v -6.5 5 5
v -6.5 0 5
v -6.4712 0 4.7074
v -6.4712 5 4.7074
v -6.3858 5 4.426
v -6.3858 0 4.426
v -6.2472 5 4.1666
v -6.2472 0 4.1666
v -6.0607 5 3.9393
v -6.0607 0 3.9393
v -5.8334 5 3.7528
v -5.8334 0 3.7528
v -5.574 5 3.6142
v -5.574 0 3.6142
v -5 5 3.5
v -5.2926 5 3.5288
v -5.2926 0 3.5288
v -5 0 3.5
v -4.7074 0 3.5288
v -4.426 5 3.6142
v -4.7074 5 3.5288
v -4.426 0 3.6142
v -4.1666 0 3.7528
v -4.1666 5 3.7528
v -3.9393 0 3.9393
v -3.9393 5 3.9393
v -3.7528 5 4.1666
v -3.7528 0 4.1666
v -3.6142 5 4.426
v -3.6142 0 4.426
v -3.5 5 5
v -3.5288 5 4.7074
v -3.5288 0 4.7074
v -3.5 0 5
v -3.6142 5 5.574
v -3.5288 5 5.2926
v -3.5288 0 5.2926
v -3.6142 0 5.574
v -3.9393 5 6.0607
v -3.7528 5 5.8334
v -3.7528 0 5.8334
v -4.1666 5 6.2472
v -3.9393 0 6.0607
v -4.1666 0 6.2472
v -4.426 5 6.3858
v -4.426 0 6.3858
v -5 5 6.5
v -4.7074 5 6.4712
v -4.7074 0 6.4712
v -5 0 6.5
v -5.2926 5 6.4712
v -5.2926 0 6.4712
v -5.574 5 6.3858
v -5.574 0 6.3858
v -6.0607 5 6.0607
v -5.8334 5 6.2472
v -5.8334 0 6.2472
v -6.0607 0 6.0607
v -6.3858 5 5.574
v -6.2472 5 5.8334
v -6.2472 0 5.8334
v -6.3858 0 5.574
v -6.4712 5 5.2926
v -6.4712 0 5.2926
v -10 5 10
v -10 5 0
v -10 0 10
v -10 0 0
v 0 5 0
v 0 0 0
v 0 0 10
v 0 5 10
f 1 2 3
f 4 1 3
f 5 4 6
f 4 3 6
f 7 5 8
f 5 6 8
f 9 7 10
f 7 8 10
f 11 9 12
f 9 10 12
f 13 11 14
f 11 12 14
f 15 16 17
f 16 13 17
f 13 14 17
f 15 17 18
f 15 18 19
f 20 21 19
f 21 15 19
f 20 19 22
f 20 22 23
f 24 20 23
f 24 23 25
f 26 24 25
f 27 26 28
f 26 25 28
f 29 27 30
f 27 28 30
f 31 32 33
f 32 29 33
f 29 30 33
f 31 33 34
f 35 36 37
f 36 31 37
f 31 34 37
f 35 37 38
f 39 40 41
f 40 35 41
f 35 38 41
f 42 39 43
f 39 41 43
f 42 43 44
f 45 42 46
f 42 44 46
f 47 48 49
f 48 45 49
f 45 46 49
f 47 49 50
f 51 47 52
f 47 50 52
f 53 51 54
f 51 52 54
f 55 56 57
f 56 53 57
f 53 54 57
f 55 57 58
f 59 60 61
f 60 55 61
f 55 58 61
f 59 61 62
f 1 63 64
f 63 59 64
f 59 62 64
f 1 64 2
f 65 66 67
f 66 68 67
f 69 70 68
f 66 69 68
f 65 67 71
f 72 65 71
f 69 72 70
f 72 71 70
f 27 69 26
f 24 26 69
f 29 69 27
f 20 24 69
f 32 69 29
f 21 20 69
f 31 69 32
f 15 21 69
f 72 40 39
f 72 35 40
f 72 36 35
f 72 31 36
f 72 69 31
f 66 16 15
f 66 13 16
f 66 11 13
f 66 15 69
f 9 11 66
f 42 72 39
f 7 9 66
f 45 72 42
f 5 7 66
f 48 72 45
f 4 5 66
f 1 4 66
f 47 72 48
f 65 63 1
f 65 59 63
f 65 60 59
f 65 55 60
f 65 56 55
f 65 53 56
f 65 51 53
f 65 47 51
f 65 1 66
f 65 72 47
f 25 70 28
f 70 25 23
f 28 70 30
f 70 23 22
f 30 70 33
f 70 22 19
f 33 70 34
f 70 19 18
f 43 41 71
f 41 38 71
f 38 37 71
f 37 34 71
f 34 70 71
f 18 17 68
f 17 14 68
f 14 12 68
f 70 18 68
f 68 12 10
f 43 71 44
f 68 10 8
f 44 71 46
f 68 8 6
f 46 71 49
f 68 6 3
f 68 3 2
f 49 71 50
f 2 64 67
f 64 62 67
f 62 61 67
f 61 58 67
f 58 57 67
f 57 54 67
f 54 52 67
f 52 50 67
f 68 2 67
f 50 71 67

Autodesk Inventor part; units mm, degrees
ref_plane "YZ Plane" through (0, 0, 0) normal (1, 0, 0) x (0, 1, 0)
ref_plane "XZ Plane" through (0, 0, 0) normal (0, 1, 0) x (-1, 0, 0)
ref_plane "XY Plane" through (0, 0, 0) normal (0, 0, 1) x (1, 0, 0)
sketch "Sketch1" plane through (0, 0, 0) normal (0, 1, 0) x (-1, 0, 0)
  line L0 (0, 0) -> (10, 0)
  line L1 (10, 0) -> (10, 10)
  line L2 (10, 10) -> (0, 10)
  line L3 (0, 10) -> (0, 0)
  circle A0 centre (5, 5) radius 1.5
  point P0 (10, 5)
  point P1 (5, 10)
  dimension "d0" = 10
  dimension "d1" = 10
  dimension "d4" = 3
extrude "Extrusion1" add sketch "Sketch1" along normal blind 5
properties part number "spacer"
